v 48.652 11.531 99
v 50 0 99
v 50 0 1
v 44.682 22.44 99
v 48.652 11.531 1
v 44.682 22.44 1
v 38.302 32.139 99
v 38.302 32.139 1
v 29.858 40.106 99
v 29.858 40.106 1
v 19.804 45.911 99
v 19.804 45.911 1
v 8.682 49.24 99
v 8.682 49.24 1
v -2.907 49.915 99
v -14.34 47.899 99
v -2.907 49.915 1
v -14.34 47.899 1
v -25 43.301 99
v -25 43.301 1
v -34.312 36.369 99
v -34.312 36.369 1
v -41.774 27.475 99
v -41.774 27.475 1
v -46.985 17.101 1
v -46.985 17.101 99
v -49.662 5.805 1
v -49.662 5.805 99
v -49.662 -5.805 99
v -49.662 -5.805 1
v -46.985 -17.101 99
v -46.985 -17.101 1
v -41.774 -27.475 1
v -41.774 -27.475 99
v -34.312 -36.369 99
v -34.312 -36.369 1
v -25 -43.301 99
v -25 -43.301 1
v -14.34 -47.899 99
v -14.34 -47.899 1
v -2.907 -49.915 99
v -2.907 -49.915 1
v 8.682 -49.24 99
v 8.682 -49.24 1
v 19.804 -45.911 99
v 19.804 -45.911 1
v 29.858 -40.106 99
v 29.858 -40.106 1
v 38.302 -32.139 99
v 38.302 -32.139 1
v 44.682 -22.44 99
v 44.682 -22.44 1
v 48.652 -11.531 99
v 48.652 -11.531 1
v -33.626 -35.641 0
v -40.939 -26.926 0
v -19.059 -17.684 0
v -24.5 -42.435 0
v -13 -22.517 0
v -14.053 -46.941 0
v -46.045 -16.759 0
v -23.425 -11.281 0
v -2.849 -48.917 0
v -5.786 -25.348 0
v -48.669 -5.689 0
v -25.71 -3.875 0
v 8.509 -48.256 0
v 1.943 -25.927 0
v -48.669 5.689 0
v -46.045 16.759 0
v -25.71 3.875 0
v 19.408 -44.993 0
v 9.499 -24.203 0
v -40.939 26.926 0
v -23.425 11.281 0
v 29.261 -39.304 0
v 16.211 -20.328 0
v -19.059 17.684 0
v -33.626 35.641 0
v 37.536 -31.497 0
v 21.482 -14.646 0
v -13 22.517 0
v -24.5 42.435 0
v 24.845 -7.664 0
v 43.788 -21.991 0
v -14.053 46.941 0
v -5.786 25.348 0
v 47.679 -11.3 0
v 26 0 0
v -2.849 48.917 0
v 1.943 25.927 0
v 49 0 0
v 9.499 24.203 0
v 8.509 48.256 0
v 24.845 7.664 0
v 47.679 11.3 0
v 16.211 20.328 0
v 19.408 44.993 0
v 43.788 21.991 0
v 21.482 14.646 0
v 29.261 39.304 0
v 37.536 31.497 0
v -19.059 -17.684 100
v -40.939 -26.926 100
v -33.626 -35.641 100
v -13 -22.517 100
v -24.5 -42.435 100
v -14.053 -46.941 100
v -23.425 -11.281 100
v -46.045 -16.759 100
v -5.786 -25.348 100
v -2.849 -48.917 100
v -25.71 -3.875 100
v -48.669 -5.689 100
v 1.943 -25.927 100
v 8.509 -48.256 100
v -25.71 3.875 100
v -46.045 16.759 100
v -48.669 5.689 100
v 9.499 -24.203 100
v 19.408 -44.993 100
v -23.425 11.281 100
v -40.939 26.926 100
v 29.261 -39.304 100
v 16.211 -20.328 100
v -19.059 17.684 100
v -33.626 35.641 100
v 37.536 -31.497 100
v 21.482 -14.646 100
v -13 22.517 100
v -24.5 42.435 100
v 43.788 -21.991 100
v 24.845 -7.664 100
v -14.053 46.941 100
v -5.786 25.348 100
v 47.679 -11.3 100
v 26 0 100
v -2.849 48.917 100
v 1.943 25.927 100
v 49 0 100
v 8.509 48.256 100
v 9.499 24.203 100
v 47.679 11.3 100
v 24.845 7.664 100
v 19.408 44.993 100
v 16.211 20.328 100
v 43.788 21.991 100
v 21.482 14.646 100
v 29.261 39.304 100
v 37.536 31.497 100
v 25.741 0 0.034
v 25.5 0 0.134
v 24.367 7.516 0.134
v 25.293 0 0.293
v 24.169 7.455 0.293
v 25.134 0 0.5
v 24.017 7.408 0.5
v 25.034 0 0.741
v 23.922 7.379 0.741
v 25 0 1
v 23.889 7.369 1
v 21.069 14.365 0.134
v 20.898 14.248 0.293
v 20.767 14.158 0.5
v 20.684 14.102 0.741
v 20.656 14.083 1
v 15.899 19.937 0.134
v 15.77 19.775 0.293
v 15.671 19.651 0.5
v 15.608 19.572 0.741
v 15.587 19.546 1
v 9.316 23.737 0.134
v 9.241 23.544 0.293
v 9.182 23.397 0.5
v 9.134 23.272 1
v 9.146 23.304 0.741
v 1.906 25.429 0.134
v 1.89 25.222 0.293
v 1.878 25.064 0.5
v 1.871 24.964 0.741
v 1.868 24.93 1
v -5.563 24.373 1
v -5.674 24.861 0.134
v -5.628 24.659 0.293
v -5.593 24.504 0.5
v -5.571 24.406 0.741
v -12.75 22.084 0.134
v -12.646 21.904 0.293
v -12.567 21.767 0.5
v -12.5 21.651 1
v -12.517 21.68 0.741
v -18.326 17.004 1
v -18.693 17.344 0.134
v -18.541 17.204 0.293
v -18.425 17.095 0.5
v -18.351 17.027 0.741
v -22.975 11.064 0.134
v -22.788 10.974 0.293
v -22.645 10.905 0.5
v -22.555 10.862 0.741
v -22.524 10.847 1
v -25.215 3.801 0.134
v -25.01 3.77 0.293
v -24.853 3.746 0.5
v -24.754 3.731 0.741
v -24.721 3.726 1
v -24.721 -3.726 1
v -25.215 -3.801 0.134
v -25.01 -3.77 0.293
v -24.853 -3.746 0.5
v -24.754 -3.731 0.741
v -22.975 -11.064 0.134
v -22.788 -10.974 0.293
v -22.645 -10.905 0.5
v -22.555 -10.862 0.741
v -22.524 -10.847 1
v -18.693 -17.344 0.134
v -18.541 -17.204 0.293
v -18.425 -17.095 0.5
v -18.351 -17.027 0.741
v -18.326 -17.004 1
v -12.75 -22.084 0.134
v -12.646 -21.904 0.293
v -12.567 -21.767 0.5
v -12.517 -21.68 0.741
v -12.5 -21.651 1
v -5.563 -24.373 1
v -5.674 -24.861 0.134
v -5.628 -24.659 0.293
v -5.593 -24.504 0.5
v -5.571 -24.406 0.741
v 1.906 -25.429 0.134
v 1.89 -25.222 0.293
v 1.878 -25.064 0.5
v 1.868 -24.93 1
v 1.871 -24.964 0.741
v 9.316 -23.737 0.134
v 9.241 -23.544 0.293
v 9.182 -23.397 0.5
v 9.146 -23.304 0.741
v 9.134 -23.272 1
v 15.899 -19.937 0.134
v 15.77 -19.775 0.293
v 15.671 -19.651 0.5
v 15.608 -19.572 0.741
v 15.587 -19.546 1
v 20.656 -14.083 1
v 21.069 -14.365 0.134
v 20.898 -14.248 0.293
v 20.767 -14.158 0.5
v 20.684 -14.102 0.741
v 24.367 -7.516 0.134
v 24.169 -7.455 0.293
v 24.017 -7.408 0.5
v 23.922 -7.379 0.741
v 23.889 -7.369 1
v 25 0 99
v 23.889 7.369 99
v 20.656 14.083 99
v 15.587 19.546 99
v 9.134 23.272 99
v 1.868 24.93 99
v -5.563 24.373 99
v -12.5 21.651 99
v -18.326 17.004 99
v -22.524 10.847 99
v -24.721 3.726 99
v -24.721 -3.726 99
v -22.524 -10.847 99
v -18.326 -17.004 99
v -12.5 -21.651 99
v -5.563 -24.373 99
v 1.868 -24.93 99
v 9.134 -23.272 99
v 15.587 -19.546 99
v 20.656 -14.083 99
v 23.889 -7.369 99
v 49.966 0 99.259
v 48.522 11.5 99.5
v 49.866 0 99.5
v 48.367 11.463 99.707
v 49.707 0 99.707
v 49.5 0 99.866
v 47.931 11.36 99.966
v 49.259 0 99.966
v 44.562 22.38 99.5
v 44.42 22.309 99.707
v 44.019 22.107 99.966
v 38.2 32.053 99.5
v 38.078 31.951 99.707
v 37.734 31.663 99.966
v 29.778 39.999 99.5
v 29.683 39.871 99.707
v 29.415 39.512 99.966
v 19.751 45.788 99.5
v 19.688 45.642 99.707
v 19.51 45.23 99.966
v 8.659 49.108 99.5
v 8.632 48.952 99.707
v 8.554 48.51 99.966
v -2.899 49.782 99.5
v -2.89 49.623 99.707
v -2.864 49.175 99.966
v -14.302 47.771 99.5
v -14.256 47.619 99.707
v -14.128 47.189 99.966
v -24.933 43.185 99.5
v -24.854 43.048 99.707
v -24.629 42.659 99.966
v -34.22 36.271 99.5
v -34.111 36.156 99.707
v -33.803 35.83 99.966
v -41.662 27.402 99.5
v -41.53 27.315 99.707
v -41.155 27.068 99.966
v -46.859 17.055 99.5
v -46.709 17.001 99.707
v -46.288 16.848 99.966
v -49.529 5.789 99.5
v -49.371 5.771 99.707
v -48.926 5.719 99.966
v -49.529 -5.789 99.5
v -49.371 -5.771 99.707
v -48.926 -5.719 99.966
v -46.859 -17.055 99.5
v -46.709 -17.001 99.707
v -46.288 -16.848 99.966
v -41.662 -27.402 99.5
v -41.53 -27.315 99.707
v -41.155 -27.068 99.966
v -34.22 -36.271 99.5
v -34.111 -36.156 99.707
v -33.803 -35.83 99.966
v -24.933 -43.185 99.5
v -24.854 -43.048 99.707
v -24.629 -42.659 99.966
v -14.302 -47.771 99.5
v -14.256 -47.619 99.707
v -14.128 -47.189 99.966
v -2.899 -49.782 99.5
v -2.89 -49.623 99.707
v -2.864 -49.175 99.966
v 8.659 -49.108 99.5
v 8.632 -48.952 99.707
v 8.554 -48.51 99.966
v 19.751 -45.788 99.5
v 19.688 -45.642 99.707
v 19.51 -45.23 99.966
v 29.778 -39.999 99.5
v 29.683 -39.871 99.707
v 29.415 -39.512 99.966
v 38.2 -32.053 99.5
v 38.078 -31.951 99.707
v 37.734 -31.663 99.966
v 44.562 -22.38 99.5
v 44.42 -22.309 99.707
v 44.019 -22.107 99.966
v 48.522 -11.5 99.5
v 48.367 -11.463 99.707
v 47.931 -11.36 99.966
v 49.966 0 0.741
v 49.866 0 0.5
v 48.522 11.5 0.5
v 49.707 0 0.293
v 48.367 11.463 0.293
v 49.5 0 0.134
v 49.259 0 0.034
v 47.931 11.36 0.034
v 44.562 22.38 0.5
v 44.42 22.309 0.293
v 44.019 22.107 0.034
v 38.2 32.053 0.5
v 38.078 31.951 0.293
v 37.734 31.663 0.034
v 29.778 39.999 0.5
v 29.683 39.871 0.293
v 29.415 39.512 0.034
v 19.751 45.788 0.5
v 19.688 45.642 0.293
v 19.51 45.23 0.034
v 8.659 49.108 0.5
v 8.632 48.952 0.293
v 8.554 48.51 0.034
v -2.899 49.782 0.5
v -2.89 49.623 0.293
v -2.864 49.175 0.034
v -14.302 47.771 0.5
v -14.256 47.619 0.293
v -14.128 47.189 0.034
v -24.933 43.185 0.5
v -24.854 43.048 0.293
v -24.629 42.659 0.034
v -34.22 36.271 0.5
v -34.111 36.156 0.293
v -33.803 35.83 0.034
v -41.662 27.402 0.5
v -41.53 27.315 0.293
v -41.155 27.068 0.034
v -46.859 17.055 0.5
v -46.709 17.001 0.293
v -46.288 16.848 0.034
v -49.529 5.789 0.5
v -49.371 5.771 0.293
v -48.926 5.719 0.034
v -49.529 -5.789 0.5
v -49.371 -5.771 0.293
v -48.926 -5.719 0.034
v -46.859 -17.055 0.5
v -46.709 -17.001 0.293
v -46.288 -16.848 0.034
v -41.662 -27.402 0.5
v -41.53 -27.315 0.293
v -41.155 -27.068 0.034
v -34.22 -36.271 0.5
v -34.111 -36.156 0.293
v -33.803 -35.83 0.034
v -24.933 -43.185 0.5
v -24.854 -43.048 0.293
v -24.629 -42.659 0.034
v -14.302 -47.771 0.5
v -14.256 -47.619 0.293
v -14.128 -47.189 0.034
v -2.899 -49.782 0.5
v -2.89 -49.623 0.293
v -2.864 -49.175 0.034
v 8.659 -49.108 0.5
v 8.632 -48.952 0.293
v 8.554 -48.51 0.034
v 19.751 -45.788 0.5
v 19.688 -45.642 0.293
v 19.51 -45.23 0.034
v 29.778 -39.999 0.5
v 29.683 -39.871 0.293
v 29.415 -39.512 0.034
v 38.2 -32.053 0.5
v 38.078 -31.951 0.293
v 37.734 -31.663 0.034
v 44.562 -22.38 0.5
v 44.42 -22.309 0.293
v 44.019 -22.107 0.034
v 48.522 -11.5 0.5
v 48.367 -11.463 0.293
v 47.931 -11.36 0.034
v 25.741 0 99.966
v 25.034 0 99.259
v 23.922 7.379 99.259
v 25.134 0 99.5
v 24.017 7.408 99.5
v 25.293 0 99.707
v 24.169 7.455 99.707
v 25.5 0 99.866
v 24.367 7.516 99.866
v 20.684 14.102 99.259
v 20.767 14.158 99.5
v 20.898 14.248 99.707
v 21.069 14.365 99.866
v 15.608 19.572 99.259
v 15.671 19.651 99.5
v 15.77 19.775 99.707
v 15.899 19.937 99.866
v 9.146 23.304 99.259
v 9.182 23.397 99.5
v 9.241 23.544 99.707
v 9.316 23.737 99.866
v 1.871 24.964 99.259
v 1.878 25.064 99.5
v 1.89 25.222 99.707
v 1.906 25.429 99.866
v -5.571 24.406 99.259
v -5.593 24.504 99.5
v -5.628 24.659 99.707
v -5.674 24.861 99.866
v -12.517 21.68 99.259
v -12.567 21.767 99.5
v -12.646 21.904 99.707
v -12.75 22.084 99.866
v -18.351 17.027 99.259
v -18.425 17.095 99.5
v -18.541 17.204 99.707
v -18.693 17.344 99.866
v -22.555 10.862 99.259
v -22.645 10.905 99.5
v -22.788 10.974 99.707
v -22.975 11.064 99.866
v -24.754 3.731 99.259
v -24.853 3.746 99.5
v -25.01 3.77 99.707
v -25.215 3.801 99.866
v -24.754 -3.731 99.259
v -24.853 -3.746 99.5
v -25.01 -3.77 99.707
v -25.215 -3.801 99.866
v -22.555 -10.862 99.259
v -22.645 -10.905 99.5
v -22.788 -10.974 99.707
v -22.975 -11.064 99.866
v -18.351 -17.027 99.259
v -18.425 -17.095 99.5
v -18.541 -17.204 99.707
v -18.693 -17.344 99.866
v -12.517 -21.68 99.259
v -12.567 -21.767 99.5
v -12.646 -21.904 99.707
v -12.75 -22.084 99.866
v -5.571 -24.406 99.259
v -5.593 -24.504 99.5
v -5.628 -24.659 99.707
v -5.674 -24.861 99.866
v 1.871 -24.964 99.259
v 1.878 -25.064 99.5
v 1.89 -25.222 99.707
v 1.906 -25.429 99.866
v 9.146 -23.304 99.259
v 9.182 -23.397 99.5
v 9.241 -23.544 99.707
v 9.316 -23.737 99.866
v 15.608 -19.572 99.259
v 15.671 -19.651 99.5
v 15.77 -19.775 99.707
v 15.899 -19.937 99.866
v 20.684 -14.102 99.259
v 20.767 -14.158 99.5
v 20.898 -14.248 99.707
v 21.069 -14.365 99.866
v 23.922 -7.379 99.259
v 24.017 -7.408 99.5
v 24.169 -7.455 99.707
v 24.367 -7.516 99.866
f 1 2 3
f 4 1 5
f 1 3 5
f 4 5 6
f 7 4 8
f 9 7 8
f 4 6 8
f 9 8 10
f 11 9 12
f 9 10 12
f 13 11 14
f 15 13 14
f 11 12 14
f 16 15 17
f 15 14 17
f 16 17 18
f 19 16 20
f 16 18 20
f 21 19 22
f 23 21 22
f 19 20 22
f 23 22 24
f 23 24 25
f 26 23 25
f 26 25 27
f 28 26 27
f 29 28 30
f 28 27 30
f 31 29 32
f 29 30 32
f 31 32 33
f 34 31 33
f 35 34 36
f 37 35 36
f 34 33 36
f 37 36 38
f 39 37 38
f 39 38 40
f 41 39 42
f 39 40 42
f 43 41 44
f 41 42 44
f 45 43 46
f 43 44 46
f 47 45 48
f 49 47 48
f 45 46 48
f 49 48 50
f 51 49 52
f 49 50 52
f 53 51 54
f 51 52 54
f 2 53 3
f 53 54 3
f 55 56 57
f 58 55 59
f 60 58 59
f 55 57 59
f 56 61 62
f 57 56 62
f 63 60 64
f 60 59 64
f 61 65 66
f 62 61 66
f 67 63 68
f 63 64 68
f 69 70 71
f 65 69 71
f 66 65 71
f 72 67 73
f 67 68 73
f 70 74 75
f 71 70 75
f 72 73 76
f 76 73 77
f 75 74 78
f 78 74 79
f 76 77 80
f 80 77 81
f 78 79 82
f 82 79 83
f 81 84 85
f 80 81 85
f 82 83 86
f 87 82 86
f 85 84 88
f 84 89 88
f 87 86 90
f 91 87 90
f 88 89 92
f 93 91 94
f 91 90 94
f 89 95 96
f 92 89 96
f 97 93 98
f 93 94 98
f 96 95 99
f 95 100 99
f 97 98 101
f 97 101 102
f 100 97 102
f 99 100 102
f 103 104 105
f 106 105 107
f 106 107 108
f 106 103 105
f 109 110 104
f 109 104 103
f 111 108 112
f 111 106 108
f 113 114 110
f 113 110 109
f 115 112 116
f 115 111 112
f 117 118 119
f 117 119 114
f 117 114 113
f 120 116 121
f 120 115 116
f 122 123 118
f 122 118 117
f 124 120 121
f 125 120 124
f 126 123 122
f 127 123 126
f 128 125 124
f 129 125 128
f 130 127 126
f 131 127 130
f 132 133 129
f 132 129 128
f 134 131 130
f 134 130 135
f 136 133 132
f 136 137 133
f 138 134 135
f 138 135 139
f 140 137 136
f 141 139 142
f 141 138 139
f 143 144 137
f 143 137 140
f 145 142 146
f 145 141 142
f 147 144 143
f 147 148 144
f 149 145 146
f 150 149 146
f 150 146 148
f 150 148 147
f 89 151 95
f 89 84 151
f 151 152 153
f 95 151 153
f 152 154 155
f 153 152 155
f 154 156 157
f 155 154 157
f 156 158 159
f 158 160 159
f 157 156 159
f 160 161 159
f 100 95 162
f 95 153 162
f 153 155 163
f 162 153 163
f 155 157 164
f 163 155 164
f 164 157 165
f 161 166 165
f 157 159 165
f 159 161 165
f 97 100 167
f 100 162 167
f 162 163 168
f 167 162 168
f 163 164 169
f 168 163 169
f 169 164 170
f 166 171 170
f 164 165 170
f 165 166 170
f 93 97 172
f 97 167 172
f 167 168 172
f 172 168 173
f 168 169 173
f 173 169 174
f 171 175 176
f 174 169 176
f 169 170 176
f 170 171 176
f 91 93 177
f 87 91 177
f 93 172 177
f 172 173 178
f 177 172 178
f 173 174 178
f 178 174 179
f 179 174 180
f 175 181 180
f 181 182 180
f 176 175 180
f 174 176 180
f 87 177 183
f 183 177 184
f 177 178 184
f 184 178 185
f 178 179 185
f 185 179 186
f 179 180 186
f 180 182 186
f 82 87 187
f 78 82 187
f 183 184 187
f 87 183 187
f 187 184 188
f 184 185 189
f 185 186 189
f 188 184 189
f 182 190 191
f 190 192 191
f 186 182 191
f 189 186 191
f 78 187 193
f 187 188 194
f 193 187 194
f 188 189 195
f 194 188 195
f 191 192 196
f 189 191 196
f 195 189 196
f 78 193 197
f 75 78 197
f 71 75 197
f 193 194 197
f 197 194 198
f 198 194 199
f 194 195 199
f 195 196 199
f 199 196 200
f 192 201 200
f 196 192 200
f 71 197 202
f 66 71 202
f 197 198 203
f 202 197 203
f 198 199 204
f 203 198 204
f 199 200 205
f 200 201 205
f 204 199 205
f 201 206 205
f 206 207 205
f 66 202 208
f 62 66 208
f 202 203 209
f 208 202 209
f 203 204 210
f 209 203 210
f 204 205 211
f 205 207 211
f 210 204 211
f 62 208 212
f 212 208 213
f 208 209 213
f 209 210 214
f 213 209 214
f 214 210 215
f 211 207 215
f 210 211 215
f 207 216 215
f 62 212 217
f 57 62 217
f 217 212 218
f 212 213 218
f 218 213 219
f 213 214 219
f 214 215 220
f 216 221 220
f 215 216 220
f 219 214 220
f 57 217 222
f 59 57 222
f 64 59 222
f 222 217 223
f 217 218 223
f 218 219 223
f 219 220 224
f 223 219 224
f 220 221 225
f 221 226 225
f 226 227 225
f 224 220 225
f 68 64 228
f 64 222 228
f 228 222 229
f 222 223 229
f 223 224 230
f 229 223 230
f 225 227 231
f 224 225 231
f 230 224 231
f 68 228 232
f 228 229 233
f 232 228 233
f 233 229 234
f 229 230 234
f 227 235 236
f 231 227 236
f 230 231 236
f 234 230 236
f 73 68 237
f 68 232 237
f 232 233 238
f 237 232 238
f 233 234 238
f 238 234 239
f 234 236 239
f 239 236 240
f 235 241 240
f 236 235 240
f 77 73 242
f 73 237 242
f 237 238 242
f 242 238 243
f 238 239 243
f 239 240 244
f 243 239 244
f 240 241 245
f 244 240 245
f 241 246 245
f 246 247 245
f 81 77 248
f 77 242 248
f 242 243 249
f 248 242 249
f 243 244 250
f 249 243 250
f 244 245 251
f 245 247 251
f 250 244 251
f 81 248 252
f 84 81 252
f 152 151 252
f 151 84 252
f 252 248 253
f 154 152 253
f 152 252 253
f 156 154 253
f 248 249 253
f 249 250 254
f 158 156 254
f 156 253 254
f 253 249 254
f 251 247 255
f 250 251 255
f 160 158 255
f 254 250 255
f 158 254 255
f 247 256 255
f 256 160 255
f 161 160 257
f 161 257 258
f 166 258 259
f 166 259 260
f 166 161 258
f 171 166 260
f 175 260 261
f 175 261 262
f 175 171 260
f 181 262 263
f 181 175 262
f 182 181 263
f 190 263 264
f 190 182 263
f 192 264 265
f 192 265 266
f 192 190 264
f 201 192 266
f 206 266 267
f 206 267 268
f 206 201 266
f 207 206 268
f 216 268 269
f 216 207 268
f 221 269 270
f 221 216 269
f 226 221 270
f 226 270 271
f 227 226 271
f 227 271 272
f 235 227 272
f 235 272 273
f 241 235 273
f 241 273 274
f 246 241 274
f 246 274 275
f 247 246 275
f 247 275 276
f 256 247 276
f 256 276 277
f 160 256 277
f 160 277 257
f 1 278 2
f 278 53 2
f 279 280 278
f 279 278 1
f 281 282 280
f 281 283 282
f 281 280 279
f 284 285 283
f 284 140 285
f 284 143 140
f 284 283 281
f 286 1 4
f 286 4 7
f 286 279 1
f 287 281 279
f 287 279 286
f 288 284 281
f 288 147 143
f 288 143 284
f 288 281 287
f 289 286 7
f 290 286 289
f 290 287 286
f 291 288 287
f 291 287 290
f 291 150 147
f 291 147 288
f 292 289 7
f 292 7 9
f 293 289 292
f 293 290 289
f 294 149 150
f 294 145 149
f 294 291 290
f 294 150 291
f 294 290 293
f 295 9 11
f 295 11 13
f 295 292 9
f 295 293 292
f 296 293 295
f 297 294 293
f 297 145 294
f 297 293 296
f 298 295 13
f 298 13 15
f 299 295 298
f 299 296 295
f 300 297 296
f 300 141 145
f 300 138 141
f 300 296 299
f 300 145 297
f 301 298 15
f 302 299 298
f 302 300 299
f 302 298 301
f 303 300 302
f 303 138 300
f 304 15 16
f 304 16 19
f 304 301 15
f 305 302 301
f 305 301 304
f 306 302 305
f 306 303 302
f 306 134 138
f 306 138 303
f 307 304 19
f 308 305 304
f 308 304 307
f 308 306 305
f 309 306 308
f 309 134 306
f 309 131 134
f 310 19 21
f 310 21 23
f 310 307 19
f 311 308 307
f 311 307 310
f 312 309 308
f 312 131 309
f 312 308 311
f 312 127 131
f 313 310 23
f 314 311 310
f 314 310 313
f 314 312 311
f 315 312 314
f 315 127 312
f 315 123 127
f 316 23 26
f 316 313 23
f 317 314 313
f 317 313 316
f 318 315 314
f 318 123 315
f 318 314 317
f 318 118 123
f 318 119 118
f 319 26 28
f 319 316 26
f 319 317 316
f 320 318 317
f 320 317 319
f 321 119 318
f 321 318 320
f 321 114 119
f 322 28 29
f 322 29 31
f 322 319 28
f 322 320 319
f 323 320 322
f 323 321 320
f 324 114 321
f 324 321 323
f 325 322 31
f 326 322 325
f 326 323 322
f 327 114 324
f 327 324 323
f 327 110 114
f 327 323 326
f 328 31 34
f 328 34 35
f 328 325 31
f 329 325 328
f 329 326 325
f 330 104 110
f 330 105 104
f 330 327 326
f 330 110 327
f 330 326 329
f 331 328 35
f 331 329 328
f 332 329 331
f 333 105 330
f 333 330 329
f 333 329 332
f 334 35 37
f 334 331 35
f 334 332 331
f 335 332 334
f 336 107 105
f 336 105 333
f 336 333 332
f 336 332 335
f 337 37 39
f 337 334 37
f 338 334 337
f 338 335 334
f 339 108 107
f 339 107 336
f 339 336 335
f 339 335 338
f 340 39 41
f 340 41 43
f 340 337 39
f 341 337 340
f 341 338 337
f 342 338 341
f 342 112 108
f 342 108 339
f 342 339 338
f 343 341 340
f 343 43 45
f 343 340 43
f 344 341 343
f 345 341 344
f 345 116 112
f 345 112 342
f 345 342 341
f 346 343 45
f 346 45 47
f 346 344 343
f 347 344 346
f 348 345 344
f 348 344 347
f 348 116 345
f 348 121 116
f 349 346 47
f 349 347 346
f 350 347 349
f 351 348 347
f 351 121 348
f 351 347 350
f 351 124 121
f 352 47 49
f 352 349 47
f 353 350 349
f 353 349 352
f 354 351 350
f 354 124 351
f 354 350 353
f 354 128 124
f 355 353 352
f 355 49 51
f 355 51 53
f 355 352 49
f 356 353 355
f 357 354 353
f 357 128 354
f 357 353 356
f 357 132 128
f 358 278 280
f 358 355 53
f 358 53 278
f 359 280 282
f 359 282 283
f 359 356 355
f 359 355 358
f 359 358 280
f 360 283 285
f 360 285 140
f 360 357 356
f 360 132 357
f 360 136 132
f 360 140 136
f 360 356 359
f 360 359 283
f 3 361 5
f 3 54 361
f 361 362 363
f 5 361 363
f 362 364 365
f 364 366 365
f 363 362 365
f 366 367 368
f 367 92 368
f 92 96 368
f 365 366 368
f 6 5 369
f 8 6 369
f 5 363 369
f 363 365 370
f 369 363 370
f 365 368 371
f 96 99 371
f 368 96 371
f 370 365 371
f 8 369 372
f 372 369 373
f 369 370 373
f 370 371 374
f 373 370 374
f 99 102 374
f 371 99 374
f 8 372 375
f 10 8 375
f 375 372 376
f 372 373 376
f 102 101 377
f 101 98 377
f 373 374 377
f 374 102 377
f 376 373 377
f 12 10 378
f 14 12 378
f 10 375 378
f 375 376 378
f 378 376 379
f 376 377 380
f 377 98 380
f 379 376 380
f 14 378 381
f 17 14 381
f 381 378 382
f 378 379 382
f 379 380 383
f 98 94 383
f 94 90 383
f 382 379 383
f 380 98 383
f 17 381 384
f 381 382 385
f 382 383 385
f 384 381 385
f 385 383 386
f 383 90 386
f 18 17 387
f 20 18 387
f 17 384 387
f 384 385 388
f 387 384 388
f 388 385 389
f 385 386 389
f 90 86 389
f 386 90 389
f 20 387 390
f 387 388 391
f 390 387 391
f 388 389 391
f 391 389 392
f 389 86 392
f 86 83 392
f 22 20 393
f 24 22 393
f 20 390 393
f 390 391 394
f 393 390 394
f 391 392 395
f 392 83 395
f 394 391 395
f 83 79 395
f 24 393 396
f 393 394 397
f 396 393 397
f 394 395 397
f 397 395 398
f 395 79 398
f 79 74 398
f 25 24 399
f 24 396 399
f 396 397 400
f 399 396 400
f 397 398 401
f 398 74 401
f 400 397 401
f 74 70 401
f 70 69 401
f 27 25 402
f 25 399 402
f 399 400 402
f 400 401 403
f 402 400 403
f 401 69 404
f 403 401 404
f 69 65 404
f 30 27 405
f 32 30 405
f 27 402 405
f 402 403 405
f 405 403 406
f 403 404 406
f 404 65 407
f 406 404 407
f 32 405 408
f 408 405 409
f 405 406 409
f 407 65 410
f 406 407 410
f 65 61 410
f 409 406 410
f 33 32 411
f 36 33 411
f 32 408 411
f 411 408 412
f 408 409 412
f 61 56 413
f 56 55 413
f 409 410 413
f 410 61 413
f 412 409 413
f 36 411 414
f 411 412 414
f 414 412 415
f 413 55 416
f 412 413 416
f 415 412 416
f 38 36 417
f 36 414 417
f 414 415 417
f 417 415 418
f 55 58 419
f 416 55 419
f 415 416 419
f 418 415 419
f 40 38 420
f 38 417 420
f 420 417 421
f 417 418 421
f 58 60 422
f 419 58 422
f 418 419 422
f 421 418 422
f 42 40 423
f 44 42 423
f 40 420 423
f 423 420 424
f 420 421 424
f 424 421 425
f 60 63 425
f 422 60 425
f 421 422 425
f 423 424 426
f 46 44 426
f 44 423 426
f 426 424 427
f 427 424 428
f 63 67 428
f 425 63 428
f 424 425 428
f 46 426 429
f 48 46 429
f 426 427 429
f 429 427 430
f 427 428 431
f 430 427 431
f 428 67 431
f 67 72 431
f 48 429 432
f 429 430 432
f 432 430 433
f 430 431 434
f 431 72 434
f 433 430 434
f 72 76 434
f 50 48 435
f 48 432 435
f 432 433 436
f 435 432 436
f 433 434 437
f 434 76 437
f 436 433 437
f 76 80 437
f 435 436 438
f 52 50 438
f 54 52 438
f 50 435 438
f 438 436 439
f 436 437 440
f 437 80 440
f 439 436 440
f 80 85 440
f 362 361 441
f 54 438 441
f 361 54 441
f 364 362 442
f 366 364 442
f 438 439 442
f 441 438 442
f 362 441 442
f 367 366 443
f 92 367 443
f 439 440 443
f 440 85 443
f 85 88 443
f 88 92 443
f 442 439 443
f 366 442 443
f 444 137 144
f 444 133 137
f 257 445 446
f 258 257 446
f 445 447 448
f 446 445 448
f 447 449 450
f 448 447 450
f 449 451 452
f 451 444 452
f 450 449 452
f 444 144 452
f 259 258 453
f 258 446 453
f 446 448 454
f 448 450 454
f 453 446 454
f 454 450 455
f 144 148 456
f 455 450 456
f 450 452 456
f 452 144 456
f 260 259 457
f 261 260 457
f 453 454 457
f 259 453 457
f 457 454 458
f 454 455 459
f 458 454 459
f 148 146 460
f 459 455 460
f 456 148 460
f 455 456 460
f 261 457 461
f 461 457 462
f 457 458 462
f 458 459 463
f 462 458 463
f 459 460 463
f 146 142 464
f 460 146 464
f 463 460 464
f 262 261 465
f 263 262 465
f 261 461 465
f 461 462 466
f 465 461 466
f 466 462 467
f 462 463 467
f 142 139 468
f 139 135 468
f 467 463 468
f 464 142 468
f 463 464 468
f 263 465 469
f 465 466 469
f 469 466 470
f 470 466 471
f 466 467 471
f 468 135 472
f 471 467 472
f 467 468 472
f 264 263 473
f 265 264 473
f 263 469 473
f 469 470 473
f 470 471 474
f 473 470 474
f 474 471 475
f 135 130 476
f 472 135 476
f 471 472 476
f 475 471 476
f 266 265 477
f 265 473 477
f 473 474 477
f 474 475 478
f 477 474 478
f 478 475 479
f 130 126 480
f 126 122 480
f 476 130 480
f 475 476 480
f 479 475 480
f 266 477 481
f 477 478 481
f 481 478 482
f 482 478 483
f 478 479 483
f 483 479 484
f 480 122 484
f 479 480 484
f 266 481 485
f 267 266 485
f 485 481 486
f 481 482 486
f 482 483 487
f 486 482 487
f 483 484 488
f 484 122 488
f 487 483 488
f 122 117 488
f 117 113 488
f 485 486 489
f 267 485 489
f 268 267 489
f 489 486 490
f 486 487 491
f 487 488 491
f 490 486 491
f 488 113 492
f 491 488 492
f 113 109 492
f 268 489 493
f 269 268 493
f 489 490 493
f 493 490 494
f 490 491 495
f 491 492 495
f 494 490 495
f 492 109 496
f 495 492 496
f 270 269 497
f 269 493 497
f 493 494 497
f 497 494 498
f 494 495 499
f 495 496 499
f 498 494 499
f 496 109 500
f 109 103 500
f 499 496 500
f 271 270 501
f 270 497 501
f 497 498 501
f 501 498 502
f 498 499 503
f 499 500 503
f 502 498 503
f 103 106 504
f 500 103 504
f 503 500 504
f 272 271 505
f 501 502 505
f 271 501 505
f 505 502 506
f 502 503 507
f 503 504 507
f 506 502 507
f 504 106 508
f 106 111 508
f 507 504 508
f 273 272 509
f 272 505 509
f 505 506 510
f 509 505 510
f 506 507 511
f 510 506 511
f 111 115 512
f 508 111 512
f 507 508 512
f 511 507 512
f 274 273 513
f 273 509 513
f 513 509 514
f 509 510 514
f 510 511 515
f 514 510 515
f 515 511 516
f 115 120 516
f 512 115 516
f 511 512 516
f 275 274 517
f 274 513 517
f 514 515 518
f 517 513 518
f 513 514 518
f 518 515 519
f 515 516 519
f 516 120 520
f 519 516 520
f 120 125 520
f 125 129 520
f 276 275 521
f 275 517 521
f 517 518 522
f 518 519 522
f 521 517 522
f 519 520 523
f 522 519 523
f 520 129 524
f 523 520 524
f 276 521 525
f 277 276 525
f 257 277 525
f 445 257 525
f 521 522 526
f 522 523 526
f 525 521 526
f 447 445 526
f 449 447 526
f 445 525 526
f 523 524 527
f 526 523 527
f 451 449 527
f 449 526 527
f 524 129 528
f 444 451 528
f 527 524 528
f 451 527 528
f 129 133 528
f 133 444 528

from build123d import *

# Parameters (mm, degrees)
F0_R     = 50
F1_DEPTH = 100
F2_T     = -25
F3_R     = 1


with BuildPart() as f1:
    # F0 (on Top) → F1 (new body)
    with BuildSketch(Plane.XY):
        Circle(F0_R)
    extrude(amount=F1_DEPTH)

    # F2
    f2_openings = [f1.faces().sort_by_distance(p)[0] for p in [
        (0, 0, 100),
        (0, 0, 0),
    ]]
    offset(amount=F2_T, openings=f2_openings)

    # F3
    f3_edges = [f1.edges().sort_by_distance(p)[0] for p in [
        (-50, 0, 100),
        (-25, 0, 100),
        (-50, 0, 0),
        (-25, 0, 0),
    ]]
    fillet(f3_edges, radius=F3_R)


solid = f1.part
